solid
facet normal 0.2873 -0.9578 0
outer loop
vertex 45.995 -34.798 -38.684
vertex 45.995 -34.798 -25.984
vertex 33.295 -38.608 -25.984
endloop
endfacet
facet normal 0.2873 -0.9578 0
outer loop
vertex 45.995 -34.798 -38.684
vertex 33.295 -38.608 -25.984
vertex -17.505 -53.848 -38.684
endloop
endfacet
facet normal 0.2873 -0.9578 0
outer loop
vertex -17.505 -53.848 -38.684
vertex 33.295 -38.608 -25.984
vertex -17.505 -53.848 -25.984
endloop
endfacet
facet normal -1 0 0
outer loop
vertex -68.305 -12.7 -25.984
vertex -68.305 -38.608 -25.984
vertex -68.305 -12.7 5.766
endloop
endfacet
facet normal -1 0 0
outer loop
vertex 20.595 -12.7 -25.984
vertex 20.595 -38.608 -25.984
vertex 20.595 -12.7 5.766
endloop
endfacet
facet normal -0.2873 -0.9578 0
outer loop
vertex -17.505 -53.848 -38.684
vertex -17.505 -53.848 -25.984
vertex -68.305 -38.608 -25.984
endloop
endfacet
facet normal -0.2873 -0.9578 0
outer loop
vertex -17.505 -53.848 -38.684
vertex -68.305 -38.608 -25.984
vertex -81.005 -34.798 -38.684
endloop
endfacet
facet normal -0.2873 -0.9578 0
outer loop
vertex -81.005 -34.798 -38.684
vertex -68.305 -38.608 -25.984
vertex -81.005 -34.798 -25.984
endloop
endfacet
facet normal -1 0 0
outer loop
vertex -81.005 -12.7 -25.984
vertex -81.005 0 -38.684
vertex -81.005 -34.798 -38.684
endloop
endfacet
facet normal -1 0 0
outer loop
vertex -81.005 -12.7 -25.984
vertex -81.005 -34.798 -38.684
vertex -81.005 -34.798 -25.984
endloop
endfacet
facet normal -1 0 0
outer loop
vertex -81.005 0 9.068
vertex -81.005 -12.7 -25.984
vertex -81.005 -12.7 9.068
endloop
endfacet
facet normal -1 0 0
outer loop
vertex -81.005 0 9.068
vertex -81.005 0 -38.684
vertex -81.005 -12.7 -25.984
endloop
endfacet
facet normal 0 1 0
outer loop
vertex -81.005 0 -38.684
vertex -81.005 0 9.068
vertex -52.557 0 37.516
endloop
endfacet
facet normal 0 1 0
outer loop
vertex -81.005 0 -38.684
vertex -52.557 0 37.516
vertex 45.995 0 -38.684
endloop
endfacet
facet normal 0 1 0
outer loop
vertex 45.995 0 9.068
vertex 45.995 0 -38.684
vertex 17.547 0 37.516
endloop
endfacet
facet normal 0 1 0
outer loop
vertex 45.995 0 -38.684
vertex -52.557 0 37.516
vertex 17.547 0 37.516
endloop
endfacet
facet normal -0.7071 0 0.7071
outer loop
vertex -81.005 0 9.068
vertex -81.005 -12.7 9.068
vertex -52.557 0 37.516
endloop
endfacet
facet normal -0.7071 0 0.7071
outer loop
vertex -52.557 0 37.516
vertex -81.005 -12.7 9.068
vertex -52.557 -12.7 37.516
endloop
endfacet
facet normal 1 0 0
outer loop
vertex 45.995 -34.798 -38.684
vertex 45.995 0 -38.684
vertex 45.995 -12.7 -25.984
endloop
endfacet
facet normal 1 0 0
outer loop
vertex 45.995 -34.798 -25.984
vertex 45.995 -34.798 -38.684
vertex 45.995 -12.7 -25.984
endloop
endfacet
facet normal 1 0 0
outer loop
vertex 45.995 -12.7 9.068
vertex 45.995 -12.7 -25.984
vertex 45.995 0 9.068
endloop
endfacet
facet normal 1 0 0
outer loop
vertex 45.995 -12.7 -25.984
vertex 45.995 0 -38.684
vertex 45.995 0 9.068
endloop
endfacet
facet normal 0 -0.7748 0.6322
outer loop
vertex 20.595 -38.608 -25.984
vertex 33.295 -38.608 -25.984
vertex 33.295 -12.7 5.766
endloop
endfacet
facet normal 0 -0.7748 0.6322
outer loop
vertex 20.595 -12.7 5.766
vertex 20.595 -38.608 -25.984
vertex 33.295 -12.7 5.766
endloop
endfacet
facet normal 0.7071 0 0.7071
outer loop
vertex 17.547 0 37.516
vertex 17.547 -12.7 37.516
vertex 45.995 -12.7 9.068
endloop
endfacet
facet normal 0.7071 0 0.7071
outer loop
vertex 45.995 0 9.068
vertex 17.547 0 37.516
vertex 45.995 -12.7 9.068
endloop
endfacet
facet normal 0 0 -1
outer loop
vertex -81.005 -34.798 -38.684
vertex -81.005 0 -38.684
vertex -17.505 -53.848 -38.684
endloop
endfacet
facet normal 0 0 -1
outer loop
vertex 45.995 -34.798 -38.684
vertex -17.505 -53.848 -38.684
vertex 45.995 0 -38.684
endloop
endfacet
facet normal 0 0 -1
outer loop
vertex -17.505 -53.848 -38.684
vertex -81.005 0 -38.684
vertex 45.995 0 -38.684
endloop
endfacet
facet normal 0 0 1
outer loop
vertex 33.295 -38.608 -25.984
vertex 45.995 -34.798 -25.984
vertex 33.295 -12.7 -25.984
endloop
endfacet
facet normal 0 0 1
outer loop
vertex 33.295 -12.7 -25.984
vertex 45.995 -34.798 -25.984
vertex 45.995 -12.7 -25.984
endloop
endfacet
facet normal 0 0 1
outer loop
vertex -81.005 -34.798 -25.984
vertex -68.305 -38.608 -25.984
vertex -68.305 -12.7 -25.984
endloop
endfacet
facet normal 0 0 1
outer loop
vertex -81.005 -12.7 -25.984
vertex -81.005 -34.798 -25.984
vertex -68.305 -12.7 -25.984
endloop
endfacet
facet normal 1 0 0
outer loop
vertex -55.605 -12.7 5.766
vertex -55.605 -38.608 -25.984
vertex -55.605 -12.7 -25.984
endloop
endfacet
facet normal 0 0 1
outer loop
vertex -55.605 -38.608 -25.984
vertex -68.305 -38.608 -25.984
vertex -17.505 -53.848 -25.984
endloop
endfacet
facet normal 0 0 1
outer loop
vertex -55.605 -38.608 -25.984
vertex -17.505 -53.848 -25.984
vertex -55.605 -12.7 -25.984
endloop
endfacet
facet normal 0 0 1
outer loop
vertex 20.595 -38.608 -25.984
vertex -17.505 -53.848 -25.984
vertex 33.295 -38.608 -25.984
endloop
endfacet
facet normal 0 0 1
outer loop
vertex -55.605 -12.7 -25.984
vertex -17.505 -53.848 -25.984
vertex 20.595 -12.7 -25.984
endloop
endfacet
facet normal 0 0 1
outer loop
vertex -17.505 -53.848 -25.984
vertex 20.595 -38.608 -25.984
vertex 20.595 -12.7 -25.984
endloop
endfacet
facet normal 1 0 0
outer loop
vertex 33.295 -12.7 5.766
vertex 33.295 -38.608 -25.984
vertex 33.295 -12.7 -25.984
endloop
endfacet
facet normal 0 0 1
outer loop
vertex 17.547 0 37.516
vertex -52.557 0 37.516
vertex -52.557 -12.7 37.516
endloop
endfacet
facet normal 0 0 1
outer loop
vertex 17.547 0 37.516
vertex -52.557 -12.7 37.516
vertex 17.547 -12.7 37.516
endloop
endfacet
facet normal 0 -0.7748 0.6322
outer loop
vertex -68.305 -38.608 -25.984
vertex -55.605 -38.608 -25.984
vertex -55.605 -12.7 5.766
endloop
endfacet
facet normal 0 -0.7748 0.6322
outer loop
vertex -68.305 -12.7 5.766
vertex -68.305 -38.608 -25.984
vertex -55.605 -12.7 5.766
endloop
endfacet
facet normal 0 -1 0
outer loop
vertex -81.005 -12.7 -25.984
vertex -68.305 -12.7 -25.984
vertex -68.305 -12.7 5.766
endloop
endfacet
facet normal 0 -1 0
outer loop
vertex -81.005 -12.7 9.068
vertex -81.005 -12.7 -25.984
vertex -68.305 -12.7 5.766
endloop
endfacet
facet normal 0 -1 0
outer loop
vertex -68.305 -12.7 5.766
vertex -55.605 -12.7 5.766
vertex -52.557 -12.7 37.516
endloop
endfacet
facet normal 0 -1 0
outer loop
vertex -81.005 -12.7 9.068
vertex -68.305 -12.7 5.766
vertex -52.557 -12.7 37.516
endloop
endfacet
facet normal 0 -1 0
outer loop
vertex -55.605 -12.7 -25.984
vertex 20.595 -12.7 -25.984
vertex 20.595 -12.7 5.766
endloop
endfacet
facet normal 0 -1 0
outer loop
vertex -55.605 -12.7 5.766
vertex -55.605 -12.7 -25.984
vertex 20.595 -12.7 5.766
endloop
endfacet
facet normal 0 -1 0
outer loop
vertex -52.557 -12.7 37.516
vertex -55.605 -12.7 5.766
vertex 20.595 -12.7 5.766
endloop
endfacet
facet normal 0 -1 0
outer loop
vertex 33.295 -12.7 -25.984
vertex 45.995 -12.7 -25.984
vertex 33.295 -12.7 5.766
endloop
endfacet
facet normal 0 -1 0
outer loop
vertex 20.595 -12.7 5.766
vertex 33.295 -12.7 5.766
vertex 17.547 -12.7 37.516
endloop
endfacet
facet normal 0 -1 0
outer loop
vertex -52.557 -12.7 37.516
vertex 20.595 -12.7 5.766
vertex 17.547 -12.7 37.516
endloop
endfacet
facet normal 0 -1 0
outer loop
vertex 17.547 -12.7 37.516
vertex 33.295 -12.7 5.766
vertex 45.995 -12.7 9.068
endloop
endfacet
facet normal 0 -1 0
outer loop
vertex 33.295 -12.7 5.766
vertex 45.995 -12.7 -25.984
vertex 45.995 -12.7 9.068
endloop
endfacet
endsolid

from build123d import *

# Parameters (mm, degrees)
F0_W      = 127
F0_H      = 76.2
F1_DEPTH  = 53.848
F2_W      = 41.148
F2_H      = 63.5
F3_DEPTH  = 127
F5_DEPTH  = 12.7
F7_DEPTH  = 12.7
F8_W      = 12.7
F8_H      = 25.908
F9_DEPTH  = 31.75
F11_DEPTH = 12.7
F13_DEPTH = 12.7


with BuildPart() as f1:
    # F0 (on Front) → F1 (new body)
    with BuildSketch(Plane.XZ):
        with Locations((-17.504597, -0.584449)):
            Rectangle(F0_W, F0_H)
    extrude(amount=F1_DEPTH)

    # F2 (on face) → F3 (cut)
    with BuildSketch(Plane.YZ.offset(45.995403)):
        with Locations((-33.274, 5.765551)):
            Rectangle(F2_W, F2_H)
    extrude(amount=-F3_DEPTH, mode=Mode.SUBTRACT)

    # F4 (on face) → F5 (cut)
    with BuildSketch(Plane.XZ.offset(12.7)):
        Polygon((45.995403, 9.067551), (45.995403, 37.515551), (17.547403, 37.515551), align=None)
        Polygon((-52.556597, 37.515551), (-81.004597, 37.515551), (-81.004597, 9.067551), align=None)
    extrude(amount=-F5_DEPTH, mode=Mode.SUBTRACT)

    # F6 (on face) → F7 (cut)
    with BuildSketch(Plane.XY.offset(-25.984449)):
        Polygon((45.995403, -34.798), (-17.504597, -53.848), (45.995403, -53.848), align=None)
        Polygon((-81.004597, -53.848), (-17.504597, -53.848), (-81.004597, -34.798), align=None)
    extrude(amount=-F7_DEPTH, mode=Mode.SUBTRACT)

    # F8 (on face) → F9 (join)
    with BuildSketch(Plane.XY.offset(-25.984449)):
        with Locations((26.945403, -25.654)):
            Rectangle(F8_W, F8_H)
        with Locations((-61.954597, -25.654)):
            Rectangle(F8_W, F8_H)
    extrude(amount=F9_DEPTH)

    # F10 (on face) → F11 (cut)
    with BuildSketch(Plane.YZ.offset(-55.604597)):
        Polygon((-38.608, -25.984449), (-12.7, 5.765551), (-38.608, 5.765551), align=None)
    extrude(amount=-F11_DEPTH, mode=Mode.SUBTRACT)

    # F12 (on face) → F13 (cut)
    with BuildSketch(Plane.YZ.offset(33.295403)):
        Polygon((-38.608, -25.984449), (-12.7, 5.765551), (-38.608, 5.765551), align=None)
    extrude(amount=-F13_DEPTH, mode=Mode.SUBTRACT)


solid = f1.part
